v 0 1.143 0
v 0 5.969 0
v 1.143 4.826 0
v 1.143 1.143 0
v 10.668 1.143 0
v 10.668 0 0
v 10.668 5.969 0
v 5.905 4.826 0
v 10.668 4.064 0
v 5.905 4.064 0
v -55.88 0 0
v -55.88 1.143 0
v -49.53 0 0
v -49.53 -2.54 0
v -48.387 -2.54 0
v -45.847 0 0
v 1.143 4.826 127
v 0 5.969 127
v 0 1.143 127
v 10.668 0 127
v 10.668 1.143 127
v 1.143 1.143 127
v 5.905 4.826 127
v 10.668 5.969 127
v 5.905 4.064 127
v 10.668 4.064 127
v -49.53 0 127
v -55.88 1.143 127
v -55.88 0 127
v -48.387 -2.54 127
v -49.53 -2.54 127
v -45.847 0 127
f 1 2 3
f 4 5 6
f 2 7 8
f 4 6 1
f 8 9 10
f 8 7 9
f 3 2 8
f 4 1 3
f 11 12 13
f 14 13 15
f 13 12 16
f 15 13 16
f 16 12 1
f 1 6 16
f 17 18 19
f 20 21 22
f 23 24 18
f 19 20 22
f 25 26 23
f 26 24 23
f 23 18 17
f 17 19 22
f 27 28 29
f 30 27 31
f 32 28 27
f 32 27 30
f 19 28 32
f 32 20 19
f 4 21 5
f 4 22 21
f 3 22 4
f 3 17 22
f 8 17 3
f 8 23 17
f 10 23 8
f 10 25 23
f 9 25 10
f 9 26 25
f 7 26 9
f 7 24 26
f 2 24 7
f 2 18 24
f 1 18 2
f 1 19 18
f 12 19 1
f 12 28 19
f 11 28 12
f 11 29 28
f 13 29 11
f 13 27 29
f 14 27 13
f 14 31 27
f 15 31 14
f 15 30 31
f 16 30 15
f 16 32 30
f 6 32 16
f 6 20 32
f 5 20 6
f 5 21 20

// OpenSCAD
inch = 25.4; // mm

wall_thickness = .045 * inch;
splashguard_depth = 2.2 * inch; // Overall depth to cover from edge of glass to edge of tank
extrude_len = 5 * inch; // Length of the splashguard/tank (or bed height of your printer and print multiple sections)

glass_capture_depth = .375 * inch; // Portion that captures onto the glass
glass_capture_thickness = (.125-.01) * inch; // actual glass thickness, may benefit from a tiny fudge factor
glass_capture_pocket_height = .03 * inch; // Add a small non-contacting pocket & lip over the back of the capture edge for a little extra give
glass_capture_pocket_length_ratio = 0.5; // non-contacting portion of the pocket (0.0 = 0% to 1.0 = 100%)

use_back_edge_stop = true; // If downward-hanging 'stop' desired near rear tank edge
back_edge_stop_setback = .250 * inch; // Setback from back edge of splashguard to relevant face of edge stop
back_edge_stop_depth = .100 * inch; // Depth (downward height) of feature

fudge = .0001;

linear_extrude(height=extrude_len)
{

    // capture; tracing the shape counterclockwise
    polygon([ [0,0], [glass_capture_depth+wall_thickness,0], [glass_capture_depth+wall_thickness, wall_thickness], [wall_thickness,wall_thickness], /* bottom*/
        [wall_thickness,wall_thickness+glass_capture_thickness + glass_capture_pocket_height], /*vertical, start of pocket*/ 
        [wall_thickness + (glass_capture_depth*glass_capture_pocket_length_ratio),wall_thickness+glass_capture_thickness + glass_capture_pocket_height],
        [wall_thickness + (glass_capture_depth*(1-glass_capture_pocket_length_ratio)),wall_thickness+glass_capture_thickness], /* capture lip, after pocket*/
        [wall_thickness+glass_capture_depth,wall_thickness+glass_capture_thickness], /*bottom-right edge of lip*/
        [wall_thickness+glass_capture_depth,wall_thickness*2+glass_capture_thickness+glass_capture_pocket_height], [0,wall_thickness*2+glass_capture_thickness+glass_capture_pocket_height], [0,0] /* up and back around*/
        ]);
        // FIXME: pocket
        
    // splashguard
    polygon([ [fudge,0], [-splashguard_depth, 0], [-splashguard_depth, wall_thickness], [fudge, wall_thickness] ]);

    // bottom rear edgestop
    if(use_back_edge_stop)
    {
        polygon([ [-splashguard_depth + back_edge_stop_setback, fudge], 
            [-splashguard_depth + back_edge_stop_setback, -back_edge_stop_depth],
            [-splashguard_depth + back_edge_stop_setback + wall_thickness, -back_edge_stop_depth],
            [-splashguard_depth + back_edge_stop_setback + wall_thickness + (back_edge_stop_depth), fudge],
        ]);     /*extra 'back_edge_stop_depth' x offset on final coordinate creates bevel allowing part to be printed */
                /* vertical or horizontal without supports */
        
        /*polygon([ [-splashguard_depth + back_edge_stop_setback, fudge], 
            [-splashguard_depth + back_edge_stop_setback, -back_edge_stop_depth],
            [-splashguard_depth + back_edge_stop_setback + wall_thickness, -back_edge_stop_depth],
            [-splashguard_depth + back_edge_stop_setback + wall_thickness, fudge],
        ]);*/ 
    }
}
